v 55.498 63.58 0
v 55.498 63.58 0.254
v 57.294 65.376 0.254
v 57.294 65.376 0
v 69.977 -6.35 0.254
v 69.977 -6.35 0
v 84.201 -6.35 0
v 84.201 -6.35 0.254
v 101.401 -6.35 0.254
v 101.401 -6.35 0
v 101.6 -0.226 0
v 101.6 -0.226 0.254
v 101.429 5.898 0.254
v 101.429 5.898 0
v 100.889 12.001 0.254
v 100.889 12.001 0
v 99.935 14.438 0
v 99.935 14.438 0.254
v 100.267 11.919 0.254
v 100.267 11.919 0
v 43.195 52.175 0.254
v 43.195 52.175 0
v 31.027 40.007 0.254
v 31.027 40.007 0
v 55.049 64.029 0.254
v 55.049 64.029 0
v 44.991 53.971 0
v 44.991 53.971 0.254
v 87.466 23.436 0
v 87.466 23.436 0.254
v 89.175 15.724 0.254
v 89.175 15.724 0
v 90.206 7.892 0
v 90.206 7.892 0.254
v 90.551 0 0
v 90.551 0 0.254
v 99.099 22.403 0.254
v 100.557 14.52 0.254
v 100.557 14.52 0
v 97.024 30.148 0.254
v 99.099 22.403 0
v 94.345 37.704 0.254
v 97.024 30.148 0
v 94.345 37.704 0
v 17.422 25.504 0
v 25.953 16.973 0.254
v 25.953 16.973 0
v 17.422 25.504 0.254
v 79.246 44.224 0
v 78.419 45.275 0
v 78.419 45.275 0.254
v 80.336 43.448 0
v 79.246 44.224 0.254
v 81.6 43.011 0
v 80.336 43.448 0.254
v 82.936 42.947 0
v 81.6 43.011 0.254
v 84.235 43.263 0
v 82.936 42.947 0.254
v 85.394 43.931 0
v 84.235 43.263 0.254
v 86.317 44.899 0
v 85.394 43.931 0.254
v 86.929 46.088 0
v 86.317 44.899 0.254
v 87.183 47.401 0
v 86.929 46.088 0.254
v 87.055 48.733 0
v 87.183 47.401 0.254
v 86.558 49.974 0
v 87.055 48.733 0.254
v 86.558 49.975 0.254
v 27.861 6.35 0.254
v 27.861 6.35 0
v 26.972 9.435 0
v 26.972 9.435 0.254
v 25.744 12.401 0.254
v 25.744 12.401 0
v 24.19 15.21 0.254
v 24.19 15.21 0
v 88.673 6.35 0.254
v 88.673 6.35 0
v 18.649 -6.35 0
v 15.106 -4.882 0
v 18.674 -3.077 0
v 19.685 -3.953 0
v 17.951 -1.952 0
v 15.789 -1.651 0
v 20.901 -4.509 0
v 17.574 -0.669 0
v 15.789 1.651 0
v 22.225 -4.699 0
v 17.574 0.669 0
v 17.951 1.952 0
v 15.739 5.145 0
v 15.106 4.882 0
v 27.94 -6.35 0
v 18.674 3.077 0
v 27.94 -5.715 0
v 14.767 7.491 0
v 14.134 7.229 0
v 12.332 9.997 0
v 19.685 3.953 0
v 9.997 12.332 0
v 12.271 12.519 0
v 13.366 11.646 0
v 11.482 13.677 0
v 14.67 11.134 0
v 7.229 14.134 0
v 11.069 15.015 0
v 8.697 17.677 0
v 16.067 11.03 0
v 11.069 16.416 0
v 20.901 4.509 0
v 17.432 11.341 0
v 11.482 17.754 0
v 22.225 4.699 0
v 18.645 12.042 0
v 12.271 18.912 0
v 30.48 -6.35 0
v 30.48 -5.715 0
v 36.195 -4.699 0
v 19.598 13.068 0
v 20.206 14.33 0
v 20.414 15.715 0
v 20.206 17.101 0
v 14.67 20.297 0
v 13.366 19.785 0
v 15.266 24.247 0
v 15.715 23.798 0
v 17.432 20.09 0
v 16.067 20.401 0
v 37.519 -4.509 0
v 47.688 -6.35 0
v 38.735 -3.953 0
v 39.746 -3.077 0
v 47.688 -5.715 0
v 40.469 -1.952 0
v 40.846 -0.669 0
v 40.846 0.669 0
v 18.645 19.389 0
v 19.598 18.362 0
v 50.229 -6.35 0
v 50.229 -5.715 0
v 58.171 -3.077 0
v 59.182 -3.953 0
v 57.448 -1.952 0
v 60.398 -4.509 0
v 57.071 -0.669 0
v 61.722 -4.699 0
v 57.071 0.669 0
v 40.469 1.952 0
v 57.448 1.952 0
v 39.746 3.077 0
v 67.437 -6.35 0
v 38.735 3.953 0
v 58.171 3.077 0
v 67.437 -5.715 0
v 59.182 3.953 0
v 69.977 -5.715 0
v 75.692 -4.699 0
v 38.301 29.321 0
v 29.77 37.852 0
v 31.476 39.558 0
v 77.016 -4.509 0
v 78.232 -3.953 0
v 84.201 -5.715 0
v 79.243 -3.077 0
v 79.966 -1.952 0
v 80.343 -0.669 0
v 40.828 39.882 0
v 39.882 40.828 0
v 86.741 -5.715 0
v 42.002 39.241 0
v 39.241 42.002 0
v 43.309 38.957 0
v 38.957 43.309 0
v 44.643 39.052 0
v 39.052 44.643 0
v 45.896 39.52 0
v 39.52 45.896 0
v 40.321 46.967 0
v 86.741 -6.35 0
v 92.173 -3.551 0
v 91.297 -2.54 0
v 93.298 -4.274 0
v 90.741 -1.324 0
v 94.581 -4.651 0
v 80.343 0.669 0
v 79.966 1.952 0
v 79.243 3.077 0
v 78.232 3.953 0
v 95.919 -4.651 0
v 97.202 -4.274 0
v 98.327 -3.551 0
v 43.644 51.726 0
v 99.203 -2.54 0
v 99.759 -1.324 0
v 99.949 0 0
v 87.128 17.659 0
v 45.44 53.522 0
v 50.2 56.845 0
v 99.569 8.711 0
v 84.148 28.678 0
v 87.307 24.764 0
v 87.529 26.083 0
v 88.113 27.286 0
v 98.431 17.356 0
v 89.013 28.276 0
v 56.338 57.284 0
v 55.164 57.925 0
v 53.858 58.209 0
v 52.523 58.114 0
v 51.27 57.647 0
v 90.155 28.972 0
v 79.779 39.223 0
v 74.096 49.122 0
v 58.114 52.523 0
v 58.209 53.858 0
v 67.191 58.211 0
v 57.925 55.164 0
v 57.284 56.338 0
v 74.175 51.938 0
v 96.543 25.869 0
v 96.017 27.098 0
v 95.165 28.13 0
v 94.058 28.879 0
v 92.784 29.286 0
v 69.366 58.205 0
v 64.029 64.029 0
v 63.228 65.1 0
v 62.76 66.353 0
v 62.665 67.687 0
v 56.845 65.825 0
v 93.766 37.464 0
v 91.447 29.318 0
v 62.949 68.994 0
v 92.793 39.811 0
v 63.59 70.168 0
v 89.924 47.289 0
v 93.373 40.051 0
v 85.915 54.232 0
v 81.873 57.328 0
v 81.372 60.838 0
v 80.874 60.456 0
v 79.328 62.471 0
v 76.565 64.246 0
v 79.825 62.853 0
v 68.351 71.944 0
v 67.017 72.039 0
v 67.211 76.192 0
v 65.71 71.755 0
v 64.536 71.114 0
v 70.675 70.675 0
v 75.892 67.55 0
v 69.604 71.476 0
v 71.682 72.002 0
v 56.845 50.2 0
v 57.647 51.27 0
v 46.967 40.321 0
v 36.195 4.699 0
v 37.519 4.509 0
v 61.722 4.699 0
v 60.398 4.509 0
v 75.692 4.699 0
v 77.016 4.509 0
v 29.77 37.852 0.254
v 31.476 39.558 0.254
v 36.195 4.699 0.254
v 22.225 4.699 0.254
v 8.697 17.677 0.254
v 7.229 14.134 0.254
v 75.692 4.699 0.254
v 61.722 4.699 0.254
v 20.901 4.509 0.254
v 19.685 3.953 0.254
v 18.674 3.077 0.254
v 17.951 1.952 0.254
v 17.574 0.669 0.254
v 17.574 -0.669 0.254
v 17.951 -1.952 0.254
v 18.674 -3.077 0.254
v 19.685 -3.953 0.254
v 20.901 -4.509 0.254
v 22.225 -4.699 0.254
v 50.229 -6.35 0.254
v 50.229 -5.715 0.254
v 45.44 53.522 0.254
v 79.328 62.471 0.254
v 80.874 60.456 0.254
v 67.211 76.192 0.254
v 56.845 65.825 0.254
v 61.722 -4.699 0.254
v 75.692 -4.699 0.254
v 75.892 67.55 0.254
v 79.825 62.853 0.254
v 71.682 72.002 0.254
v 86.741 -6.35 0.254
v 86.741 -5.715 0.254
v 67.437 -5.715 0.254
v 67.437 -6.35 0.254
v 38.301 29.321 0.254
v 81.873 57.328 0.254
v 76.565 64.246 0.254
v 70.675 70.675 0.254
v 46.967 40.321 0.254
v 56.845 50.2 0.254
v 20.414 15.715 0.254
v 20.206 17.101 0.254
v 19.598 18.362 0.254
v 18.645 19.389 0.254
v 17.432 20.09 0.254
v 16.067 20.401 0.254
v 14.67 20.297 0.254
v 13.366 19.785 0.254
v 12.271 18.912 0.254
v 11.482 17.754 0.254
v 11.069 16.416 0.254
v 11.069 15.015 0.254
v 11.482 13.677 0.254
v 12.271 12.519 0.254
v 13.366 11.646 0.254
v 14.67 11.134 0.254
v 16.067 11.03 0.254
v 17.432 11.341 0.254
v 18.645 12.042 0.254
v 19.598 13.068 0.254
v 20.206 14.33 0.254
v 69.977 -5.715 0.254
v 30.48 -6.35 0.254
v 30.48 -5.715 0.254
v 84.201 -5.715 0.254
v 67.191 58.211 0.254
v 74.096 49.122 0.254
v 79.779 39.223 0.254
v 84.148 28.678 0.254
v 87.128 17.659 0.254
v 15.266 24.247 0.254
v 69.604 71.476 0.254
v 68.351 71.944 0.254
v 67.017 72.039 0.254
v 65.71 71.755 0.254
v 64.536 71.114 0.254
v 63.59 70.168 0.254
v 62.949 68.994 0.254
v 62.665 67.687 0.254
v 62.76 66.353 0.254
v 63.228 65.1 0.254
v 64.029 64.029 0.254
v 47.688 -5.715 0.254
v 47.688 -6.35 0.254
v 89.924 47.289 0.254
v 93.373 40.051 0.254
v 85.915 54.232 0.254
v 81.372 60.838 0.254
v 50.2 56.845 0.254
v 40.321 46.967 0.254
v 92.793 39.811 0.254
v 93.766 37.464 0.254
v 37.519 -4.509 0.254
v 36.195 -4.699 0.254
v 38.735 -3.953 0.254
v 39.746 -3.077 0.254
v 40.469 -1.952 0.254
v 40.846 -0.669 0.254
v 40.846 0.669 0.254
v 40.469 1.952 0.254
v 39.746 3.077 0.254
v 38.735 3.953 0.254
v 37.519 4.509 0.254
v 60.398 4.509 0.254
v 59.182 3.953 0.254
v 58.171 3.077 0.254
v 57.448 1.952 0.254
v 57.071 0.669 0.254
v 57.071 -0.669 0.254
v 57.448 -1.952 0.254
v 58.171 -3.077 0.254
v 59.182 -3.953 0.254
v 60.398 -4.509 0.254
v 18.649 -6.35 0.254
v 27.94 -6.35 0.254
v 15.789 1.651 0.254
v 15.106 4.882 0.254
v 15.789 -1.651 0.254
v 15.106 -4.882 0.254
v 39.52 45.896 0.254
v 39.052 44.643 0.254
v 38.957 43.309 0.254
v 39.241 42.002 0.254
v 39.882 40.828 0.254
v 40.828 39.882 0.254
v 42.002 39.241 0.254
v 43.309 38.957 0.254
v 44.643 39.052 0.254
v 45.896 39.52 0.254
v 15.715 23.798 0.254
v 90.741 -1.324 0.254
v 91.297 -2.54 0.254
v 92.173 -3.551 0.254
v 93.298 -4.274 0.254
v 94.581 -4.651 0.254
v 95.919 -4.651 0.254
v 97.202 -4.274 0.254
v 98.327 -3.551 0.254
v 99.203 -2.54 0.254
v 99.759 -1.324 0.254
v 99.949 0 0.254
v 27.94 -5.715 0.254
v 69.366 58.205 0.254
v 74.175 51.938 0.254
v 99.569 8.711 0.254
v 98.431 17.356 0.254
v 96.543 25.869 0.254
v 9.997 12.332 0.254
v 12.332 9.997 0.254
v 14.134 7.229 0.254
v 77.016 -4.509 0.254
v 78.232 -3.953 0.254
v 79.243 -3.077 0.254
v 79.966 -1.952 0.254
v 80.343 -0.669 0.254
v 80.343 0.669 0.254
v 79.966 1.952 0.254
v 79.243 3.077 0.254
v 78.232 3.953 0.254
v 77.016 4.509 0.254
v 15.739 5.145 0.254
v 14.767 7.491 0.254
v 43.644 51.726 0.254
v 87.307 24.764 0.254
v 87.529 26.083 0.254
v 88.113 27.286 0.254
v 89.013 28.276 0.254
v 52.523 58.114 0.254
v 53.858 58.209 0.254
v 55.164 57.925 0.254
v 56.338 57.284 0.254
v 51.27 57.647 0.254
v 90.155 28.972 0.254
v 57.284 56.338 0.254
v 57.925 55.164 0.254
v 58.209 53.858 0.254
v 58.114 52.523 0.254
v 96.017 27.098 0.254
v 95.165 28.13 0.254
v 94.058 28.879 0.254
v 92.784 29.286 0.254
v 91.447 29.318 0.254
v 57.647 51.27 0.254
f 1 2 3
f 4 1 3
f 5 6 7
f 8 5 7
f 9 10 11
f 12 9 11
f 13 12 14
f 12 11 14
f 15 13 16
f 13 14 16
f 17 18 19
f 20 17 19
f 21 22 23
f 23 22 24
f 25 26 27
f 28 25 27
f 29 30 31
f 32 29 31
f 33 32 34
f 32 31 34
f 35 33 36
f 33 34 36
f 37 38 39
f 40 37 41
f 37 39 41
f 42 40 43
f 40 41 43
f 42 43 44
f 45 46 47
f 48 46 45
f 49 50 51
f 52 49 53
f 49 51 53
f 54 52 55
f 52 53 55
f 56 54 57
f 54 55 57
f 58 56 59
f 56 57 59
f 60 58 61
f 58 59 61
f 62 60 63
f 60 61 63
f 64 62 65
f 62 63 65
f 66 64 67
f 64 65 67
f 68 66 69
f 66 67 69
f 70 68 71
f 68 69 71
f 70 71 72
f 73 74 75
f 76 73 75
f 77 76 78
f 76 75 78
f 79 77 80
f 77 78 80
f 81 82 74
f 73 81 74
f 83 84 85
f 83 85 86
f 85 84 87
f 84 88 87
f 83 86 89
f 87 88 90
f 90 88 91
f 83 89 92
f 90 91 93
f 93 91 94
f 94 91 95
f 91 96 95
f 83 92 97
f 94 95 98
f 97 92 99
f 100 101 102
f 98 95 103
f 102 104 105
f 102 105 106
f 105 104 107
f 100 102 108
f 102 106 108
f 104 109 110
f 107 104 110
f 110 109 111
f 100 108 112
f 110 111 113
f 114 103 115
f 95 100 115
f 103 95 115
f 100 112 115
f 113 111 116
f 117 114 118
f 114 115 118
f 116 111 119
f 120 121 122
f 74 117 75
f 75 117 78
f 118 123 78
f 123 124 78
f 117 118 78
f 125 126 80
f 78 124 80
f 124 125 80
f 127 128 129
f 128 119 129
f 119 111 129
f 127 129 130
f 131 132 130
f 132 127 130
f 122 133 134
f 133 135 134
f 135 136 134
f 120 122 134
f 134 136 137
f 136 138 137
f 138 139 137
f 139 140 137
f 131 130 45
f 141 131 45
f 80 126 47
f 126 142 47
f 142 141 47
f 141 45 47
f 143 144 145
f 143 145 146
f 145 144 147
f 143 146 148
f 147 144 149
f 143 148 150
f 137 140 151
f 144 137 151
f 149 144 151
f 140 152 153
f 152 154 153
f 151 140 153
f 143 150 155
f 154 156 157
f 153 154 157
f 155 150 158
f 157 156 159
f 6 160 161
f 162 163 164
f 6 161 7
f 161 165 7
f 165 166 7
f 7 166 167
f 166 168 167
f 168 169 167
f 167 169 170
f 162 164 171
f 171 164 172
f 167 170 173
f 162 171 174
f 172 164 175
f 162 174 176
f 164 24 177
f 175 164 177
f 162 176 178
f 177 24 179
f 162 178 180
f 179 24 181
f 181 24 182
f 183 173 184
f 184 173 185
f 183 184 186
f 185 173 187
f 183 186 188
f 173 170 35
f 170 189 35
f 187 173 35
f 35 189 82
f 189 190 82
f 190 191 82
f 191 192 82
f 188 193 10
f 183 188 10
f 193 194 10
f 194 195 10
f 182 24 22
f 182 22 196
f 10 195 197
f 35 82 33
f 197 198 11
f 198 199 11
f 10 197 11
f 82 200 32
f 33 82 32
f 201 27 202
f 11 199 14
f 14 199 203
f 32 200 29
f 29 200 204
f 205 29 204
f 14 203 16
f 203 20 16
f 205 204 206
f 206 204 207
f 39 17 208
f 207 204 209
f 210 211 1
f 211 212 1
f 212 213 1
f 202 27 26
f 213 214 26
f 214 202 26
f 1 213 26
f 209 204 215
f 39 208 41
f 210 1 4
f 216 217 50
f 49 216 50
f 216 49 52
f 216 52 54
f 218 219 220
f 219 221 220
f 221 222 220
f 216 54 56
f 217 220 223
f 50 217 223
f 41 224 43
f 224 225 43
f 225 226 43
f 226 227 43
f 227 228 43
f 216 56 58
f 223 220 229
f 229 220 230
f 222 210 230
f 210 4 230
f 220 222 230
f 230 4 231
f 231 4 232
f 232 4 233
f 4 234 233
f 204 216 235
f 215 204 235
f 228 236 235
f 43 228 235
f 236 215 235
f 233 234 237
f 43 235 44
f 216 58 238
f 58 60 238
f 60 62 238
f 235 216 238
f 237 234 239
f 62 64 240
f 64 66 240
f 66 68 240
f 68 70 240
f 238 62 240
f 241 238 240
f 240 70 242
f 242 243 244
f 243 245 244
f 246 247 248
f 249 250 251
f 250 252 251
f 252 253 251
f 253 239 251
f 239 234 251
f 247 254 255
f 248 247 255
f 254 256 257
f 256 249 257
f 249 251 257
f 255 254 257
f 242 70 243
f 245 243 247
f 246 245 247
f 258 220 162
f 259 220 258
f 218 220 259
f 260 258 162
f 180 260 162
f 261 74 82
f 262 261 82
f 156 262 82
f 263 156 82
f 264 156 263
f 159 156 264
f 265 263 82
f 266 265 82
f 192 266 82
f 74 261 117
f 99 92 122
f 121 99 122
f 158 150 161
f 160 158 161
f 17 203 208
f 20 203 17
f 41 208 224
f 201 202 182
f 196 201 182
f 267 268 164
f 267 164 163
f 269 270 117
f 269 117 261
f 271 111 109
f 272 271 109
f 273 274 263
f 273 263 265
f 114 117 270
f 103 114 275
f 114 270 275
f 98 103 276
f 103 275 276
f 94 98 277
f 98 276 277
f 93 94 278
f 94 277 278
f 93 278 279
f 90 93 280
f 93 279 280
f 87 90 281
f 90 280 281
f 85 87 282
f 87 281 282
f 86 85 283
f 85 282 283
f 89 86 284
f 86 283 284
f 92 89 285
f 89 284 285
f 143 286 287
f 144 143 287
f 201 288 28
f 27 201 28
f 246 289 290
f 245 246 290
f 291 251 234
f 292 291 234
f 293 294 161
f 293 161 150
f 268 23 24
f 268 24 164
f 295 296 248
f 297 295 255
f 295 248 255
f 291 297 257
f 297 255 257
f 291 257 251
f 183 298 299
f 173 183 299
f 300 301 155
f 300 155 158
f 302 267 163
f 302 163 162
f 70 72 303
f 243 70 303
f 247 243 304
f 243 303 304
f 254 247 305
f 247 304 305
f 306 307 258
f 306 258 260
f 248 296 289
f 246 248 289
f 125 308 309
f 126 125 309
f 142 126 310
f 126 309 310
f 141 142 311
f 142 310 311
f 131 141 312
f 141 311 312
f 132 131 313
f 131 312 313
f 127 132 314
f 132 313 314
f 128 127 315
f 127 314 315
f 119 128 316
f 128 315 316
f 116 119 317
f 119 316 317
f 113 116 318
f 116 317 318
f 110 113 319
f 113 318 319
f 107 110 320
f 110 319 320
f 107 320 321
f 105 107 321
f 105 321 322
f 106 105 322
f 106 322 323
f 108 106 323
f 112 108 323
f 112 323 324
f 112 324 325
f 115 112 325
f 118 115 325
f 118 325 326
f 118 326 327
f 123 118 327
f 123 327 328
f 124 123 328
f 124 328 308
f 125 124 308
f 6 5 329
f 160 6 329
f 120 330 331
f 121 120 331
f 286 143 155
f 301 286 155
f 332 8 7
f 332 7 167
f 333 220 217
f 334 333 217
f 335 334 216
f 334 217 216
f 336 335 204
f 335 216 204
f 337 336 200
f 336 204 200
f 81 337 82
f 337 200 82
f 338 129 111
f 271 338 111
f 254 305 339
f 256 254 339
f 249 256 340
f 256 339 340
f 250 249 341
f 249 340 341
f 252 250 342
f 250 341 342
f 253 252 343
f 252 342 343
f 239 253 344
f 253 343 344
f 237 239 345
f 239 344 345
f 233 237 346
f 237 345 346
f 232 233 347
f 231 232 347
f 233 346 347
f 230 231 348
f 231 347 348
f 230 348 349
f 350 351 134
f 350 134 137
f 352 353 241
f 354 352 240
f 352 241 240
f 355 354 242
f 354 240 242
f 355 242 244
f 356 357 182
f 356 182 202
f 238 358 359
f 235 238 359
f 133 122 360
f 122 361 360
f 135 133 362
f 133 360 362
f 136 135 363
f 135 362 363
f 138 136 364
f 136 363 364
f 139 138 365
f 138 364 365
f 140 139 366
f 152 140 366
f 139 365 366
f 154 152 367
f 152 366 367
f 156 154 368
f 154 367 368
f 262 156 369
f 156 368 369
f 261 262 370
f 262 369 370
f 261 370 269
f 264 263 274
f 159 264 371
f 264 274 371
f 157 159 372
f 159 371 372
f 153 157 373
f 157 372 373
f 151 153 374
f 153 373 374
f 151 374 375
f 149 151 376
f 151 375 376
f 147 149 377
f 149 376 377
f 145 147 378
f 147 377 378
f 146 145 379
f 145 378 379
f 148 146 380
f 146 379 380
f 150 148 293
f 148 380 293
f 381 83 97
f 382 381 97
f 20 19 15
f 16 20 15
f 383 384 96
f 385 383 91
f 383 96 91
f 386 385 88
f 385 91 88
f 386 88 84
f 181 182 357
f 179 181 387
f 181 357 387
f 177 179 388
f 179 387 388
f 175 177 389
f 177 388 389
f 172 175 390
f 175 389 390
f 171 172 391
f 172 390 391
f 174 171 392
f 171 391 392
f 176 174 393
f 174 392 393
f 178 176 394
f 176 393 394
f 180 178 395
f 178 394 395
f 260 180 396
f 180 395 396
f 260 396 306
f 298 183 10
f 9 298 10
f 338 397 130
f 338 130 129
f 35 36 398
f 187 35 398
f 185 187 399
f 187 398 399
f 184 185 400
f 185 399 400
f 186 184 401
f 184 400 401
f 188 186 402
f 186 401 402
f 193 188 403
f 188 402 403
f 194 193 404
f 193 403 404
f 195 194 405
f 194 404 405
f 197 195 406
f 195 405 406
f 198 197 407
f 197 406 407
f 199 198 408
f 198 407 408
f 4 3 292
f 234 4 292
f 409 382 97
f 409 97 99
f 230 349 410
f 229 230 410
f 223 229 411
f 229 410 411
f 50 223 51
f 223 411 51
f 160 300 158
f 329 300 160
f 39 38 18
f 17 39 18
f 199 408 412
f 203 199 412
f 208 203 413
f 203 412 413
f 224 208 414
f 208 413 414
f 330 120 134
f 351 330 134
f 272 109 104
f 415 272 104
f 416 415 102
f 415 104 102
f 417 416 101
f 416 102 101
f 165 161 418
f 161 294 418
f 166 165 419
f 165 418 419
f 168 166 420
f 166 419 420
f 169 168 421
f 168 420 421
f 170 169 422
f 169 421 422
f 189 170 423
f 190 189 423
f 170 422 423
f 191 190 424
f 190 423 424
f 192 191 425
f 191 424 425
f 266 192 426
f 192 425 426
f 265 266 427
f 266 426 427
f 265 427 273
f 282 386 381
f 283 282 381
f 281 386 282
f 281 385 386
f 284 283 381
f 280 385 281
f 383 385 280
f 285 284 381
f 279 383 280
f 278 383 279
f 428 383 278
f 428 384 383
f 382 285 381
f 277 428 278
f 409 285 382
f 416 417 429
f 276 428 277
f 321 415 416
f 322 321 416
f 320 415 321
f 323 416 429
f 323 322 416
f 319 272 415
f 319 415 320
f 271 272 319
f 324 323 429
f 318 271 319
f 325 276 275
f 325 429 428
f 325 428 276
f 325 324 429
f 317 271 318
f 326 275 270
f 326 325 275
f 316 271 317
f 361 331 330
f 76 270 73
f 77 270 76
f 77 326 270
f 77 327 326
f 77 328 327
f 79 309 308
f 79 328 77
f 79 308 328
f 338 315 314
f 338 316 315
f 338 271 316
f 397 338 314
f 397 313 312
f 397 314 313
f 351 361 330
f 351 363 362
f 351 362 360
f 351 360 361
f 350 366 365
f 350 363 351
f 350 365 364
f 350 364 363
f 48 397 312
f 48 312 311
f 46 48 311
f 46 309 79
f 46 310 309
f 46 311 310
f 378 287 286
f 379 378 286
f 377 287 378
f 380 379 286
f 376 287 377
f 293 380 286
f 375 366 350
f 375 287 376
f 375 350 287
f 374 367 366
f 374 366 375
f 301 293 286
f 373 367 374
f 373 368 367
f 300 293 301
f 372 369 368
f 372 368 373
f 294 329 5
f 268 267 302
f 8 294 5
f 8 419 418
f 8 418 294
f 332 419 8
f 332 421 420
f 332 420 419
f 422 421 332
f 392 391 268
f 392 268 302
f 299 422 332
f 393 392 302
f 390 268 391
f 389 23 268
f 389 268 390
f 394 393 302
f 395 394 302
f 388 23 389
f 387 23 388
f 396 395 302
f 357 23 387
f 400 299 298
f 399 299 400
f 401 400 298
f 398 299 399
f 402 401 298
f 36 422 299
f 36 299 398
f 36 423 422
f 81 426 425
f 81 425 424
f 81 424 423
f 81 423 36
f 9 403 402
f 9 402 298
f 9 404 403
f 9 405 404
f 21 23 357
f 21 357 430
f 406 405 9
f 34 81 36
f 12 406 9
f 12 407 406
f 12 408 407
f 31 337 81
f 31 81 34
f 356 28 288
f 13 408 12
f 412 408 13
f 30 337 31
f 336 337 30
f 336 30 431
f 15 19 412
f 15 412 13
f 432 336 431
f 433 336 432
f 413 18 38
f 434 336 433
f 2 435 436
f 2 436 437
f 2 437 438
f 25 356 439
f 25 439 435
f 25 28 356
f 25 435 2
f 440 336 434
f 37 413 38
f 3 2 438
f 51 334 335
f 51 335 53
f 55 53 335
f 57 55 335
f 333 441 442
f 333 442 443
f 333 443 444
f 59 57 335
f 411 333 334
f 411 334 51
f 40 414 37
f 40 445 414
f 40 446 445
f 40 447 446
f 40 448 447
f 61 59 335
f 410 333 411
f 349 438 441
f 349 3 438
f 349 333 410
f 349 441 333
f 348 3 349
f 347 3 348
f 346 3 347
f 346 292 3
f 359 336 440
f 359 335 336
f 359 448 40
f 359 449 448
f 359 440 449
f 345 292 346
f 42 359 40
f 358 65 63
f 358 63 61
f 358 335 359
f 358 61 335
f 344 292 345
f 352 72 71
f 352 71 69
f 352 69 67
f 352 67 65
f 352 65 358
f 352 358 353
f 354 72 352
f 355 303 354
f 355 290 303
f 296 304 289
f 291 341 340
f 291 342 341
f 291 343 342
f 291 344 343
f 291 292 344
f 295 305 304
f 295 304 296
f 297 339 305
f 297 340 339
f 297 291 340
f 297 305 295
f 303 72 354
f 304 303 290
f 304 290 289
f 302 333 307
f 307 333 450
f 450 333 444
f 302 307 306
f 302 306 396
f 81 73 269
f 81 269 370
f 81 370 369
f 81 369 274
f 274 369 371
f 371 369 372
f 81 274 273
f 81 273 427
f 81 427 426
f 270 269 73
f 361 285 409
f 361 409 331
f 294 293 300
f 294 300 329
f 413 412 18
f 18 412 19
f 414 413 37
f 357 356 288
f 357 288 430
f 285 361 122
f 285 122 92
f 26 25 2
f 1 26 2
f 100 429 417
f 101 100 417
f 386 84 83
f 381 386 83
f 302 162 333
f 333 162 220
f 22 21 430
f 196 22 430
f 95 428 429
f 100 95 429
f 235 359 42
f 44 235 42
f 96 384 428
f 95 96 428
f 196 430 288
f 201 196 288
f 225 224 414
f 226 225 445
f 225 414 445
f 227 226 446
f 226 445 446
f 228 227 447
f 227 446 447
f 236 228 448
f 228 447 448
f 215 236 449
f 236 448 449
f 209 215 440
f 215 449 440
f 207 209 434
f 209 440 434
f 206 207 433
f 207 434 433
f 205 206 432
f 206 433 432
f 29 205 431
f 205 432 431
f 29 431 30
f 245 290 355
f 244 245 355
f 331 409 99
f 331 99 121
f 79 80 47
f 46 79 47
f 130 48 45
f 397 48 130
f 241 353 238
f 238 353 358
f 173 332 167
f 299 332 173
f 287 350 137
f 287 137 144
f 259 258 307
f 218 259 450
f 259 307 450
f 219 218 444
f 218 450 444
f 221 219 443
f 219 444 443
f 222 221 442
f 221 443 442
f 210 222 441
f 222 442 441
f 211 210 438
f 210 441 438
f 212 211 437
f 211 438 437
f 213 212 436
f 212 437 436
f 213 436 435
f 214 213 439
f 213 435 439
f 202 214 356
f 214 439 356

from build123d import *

# Parameters (mm, degrees)
BOSS_EXTRUDE1_DEPTH = 0.254
SKETCH2_R           = 4.699
CUT_EXTRUDE1_DEPTH  = 1.254
SKETCH3_W           = 2.54
SKETCH3_H           = 0.635
CUT_EXTRUDE2_DEPTH  = 1.254
CUT_EXTRUDE4_DEPTH  = 1.254
CUT_EXTRUDE5_DEPTH  = 1.254


with BuildPart() as part:
    # Sketch1 → Boss-Extrude1 (new body)
    with BuildSketch(Plane.XY):
        with BuildLine():
            Line((67.21146711, 76.191723231), (8.696654013, 17.676910134))
            Line((8.696654013, 17.676910134), (7.228954972, 14.133571205))
            ThreePointArc((7.228954972, 14.133571205), (14.666587579, 6.075099489), (15.105587123, -4.88230096))
            Line((15.105587123, -4.88230096), (18.648926052, -6.35))
            Line((18.648926052, -6.35), (101.401368334, -6.35))
            ThreePointArc((101.401368334, -6.35), (93.866160503, 38.880636728), (67.21146711, 76.191723231))
        make_face()
        with BuildLine():
            Line((88.672924278, 6.35), (27.86051193, 6.35))
            ThreePointArc((27.86051193, 6.35), (26.399857642, 10.93517908), (24.190484974, 15.210228852))
            Line((24.190484974, 15.210228852), (67.191354125, 58.211098004))
            ThreePointArc((67.191354125, 58.211098004), (82.13289044, 34.020557137), (88.672924278, 6.35))
        make_face(mode=Mode.SUBTRACT)
    extrude(amount=BOSS_EXTRUDE1_DEPTH)

    # Sketch2 → Cut-Extrude1 (cut, through all)
    with BuildSketch(Plane.XY.offset(0.254)):
        with Locations((22.225, 0)):
            Circle(SKETCH2_R)
        with Locations((36.195, 0)):
            Circle(SKETCH2_R)
        with Locations((61.722, 0)):
            Circle(SKETCH2_R)
        with Locations((75.692, 0)):
            Circle(SKETCH2_R)
        with Locations((95.25, 0)):
            Circle(SKETCH2_R)
        with Locations((15.715448212, 15.715448212)):
            Circle(SKETCH2_R)
        with Locations((25.593729945, 25.593729945)):
            Circle(SKETCH2_R)
        with Locations((43.644044748, 43.644044748)):
            Circle(SKETCH2_R)
        with Locations((53.522326482, 53.522326482)):
            Circle(SKETCH2_R)
        with Locations((92.004434954, 24.652514046)):
            Circle(SKETCH2_R)
        with Locations((82.48891971, 47.625)):
            Circle(SKETCH2_R)
        with Locations((67.351920908, 67.351920908)):
            Circle(SKETCH2_R)
    extrude(amount=-CUT_EXTRUDE1_DEPTH, mode=Mode.SUBTRACT)

    # Sketch3 → Cut-Extrude2 (cut, through all)
    with BuildSketch(Plane.XY.offset(0.254)):
        Polygon((15.266435406, 24.246691527), (17.06248663, 26.042742751), (17.511499436, 25.593729945), (15.715448212, 23.797678721), align=None)
        Polygon((44.991083167, 53.971339288), (43.195031942, 52.175288063), (43.644044748, 51.726275257), (45.440095973, 53.522326482), align=None)
        with Locations((29.21, -6.0325)):
            Rectangle(SKETCH3_W, SKETCH3_H)
        with Locations((68.707, -6.0325)):
            Rectangle(SKETCH3_W, SKETCH3_H)
        Polygon((29.230733674, 38.210989795), (31.026784898, 40.007041019), (31.475797704, 39.558028213), (29.67974648, 37.761976989), align=None)
        Polygon((56.845021246, 65.825277367), (55.048970022, 64.029226143), (55.497982828, 63.580213337), (57.294034052, 65.376264561), align=None)
        with Locations((48.9585, -6.0325)):
            Rectangle(SKETCH3_W, SKETCH3_H)
        with Locations((85.471, -6.0325)):
            Rectangle(SKETCH3_W, SKETCH3_H)
        Polygon((99.935462164, 14.437711971), (100.266998693, 11.919442024), (101.526133667, 12.085210288), (101.194597138, 14.603480236), align=None)
        Polygon((93.765504959, 37.464305742), (94.938831965, 37.950313702), (93.966816047, 40.296967714), (92.793489041, 39.810959755), align=None)
        Polygon((79.327792988, 62.471156422), (80.874047017, 60.456038938), (81.88160576, 61.229165953), (80.33535173, 63.244283437), align=None)
        Polygon((13.593916116, 7.005422516), (14.565932035, 4.658768503), (15.739259041, 5.144776462), (14.767243123, 7.491430475), align=None)
    extrude(amount=-CUT_EXTRUDE2_DEPTH, mode=Mode.SUBTRACT)

    # Sketch6 → Cut-Extrude4 (cut, through all)
    with BuildSketch(Plane.XY.offset(0.254)):
        with BuildLine():
            Line((40.321349984, 46.966739513), (50.199631717, 56.845021246))
            ThreePointArc((50.199631717, 56.845021246), (56.845021246, 56.845021246), (56.845021246, 50.199631717))
            Line((56.845021246, 50.199631717), (46.966739513, 40.321349984))
            ThreePointArc((46.966739513, 40.321349984), (40.321349984, 40.321349984), (40.321349984, 46.966739513))
        make_face()
        with BuildLine():
            Line((22.225, 4.699), (36.195, 4.699))
            ThreePointArc((36.195, 4.699), (40.894, 0), (36.195, -4.699))
            Line((36.195, -4.699), (22.225, -4.699))
            ThreePointArc((22.225, -4.699), (17.526, 0), (22.225, 4.699))
        make_face()
        with BuildLine():
            Line((61.722, 4.699), (75.692, 4.699))
            ThreePointArc((75.692, 4.699), (80.391, 0), (75.692, -4.699))
            Line((75.692, -4.699), (61.722, -4.699))
            ThreePointArc((61.722, -4.699), (57.023, 0), (61.722, 4.699))
        make_face()
        with BuildLine():
            ThreePointArc((99.949, 0), (99.093922449, 13.045962386), (96.543320412, 25.868704739))
            ThreePointArc((96.543320412, 25.868704739), (90.788244261, 29.191399504), (87.465549496, 23.436323353))
            ThreePointArc((87.465549496, 23.436323353), (89.776323642, 11.819277232), (90.551, 0))
            ThreePointArc((90.551, 0), (95.25, -4.699), (99.949, 0))
        make_face()
        with BuildLine():
            ThreePointArc((86.558373083, 49.9745), (79.294873009, 60.845096068), (70.674615673, 70.674615673))
            ThreePointArc((70.674615673, 70.674615673), (64.029226143, 70.674615673), (64.029226143, 64.029226143))
            ThreePointArc((64.029226143, 64.029226143), (71.838938317, 55.123956158), (78.419466338, 45.2755))
            ThreePointArc((78.419466338, 45.2755), (84.83841971, 43.555546628), (86.558373083, 49.9745))
        make_face()
    extrude(amount=-CUT_EXTRUDE4_DEPTH, mode=Mode.SUBTRACT)

    # Sketch5 → Cut-Extrude5 (cut, through all)
    with BuildSketch(Plane.XY.offset(0.254)):
        Polygon((14.278607232, 28.647017026), (26.626459399, 40.994869193), (40.994869193, 26.626459399), (28.647017026, 14.278607233), align=None)
    extrude(amount=-CUT_EXTRUDE5_DEPTH, mode=Mode.SUBTRACT)


solid = part.part
